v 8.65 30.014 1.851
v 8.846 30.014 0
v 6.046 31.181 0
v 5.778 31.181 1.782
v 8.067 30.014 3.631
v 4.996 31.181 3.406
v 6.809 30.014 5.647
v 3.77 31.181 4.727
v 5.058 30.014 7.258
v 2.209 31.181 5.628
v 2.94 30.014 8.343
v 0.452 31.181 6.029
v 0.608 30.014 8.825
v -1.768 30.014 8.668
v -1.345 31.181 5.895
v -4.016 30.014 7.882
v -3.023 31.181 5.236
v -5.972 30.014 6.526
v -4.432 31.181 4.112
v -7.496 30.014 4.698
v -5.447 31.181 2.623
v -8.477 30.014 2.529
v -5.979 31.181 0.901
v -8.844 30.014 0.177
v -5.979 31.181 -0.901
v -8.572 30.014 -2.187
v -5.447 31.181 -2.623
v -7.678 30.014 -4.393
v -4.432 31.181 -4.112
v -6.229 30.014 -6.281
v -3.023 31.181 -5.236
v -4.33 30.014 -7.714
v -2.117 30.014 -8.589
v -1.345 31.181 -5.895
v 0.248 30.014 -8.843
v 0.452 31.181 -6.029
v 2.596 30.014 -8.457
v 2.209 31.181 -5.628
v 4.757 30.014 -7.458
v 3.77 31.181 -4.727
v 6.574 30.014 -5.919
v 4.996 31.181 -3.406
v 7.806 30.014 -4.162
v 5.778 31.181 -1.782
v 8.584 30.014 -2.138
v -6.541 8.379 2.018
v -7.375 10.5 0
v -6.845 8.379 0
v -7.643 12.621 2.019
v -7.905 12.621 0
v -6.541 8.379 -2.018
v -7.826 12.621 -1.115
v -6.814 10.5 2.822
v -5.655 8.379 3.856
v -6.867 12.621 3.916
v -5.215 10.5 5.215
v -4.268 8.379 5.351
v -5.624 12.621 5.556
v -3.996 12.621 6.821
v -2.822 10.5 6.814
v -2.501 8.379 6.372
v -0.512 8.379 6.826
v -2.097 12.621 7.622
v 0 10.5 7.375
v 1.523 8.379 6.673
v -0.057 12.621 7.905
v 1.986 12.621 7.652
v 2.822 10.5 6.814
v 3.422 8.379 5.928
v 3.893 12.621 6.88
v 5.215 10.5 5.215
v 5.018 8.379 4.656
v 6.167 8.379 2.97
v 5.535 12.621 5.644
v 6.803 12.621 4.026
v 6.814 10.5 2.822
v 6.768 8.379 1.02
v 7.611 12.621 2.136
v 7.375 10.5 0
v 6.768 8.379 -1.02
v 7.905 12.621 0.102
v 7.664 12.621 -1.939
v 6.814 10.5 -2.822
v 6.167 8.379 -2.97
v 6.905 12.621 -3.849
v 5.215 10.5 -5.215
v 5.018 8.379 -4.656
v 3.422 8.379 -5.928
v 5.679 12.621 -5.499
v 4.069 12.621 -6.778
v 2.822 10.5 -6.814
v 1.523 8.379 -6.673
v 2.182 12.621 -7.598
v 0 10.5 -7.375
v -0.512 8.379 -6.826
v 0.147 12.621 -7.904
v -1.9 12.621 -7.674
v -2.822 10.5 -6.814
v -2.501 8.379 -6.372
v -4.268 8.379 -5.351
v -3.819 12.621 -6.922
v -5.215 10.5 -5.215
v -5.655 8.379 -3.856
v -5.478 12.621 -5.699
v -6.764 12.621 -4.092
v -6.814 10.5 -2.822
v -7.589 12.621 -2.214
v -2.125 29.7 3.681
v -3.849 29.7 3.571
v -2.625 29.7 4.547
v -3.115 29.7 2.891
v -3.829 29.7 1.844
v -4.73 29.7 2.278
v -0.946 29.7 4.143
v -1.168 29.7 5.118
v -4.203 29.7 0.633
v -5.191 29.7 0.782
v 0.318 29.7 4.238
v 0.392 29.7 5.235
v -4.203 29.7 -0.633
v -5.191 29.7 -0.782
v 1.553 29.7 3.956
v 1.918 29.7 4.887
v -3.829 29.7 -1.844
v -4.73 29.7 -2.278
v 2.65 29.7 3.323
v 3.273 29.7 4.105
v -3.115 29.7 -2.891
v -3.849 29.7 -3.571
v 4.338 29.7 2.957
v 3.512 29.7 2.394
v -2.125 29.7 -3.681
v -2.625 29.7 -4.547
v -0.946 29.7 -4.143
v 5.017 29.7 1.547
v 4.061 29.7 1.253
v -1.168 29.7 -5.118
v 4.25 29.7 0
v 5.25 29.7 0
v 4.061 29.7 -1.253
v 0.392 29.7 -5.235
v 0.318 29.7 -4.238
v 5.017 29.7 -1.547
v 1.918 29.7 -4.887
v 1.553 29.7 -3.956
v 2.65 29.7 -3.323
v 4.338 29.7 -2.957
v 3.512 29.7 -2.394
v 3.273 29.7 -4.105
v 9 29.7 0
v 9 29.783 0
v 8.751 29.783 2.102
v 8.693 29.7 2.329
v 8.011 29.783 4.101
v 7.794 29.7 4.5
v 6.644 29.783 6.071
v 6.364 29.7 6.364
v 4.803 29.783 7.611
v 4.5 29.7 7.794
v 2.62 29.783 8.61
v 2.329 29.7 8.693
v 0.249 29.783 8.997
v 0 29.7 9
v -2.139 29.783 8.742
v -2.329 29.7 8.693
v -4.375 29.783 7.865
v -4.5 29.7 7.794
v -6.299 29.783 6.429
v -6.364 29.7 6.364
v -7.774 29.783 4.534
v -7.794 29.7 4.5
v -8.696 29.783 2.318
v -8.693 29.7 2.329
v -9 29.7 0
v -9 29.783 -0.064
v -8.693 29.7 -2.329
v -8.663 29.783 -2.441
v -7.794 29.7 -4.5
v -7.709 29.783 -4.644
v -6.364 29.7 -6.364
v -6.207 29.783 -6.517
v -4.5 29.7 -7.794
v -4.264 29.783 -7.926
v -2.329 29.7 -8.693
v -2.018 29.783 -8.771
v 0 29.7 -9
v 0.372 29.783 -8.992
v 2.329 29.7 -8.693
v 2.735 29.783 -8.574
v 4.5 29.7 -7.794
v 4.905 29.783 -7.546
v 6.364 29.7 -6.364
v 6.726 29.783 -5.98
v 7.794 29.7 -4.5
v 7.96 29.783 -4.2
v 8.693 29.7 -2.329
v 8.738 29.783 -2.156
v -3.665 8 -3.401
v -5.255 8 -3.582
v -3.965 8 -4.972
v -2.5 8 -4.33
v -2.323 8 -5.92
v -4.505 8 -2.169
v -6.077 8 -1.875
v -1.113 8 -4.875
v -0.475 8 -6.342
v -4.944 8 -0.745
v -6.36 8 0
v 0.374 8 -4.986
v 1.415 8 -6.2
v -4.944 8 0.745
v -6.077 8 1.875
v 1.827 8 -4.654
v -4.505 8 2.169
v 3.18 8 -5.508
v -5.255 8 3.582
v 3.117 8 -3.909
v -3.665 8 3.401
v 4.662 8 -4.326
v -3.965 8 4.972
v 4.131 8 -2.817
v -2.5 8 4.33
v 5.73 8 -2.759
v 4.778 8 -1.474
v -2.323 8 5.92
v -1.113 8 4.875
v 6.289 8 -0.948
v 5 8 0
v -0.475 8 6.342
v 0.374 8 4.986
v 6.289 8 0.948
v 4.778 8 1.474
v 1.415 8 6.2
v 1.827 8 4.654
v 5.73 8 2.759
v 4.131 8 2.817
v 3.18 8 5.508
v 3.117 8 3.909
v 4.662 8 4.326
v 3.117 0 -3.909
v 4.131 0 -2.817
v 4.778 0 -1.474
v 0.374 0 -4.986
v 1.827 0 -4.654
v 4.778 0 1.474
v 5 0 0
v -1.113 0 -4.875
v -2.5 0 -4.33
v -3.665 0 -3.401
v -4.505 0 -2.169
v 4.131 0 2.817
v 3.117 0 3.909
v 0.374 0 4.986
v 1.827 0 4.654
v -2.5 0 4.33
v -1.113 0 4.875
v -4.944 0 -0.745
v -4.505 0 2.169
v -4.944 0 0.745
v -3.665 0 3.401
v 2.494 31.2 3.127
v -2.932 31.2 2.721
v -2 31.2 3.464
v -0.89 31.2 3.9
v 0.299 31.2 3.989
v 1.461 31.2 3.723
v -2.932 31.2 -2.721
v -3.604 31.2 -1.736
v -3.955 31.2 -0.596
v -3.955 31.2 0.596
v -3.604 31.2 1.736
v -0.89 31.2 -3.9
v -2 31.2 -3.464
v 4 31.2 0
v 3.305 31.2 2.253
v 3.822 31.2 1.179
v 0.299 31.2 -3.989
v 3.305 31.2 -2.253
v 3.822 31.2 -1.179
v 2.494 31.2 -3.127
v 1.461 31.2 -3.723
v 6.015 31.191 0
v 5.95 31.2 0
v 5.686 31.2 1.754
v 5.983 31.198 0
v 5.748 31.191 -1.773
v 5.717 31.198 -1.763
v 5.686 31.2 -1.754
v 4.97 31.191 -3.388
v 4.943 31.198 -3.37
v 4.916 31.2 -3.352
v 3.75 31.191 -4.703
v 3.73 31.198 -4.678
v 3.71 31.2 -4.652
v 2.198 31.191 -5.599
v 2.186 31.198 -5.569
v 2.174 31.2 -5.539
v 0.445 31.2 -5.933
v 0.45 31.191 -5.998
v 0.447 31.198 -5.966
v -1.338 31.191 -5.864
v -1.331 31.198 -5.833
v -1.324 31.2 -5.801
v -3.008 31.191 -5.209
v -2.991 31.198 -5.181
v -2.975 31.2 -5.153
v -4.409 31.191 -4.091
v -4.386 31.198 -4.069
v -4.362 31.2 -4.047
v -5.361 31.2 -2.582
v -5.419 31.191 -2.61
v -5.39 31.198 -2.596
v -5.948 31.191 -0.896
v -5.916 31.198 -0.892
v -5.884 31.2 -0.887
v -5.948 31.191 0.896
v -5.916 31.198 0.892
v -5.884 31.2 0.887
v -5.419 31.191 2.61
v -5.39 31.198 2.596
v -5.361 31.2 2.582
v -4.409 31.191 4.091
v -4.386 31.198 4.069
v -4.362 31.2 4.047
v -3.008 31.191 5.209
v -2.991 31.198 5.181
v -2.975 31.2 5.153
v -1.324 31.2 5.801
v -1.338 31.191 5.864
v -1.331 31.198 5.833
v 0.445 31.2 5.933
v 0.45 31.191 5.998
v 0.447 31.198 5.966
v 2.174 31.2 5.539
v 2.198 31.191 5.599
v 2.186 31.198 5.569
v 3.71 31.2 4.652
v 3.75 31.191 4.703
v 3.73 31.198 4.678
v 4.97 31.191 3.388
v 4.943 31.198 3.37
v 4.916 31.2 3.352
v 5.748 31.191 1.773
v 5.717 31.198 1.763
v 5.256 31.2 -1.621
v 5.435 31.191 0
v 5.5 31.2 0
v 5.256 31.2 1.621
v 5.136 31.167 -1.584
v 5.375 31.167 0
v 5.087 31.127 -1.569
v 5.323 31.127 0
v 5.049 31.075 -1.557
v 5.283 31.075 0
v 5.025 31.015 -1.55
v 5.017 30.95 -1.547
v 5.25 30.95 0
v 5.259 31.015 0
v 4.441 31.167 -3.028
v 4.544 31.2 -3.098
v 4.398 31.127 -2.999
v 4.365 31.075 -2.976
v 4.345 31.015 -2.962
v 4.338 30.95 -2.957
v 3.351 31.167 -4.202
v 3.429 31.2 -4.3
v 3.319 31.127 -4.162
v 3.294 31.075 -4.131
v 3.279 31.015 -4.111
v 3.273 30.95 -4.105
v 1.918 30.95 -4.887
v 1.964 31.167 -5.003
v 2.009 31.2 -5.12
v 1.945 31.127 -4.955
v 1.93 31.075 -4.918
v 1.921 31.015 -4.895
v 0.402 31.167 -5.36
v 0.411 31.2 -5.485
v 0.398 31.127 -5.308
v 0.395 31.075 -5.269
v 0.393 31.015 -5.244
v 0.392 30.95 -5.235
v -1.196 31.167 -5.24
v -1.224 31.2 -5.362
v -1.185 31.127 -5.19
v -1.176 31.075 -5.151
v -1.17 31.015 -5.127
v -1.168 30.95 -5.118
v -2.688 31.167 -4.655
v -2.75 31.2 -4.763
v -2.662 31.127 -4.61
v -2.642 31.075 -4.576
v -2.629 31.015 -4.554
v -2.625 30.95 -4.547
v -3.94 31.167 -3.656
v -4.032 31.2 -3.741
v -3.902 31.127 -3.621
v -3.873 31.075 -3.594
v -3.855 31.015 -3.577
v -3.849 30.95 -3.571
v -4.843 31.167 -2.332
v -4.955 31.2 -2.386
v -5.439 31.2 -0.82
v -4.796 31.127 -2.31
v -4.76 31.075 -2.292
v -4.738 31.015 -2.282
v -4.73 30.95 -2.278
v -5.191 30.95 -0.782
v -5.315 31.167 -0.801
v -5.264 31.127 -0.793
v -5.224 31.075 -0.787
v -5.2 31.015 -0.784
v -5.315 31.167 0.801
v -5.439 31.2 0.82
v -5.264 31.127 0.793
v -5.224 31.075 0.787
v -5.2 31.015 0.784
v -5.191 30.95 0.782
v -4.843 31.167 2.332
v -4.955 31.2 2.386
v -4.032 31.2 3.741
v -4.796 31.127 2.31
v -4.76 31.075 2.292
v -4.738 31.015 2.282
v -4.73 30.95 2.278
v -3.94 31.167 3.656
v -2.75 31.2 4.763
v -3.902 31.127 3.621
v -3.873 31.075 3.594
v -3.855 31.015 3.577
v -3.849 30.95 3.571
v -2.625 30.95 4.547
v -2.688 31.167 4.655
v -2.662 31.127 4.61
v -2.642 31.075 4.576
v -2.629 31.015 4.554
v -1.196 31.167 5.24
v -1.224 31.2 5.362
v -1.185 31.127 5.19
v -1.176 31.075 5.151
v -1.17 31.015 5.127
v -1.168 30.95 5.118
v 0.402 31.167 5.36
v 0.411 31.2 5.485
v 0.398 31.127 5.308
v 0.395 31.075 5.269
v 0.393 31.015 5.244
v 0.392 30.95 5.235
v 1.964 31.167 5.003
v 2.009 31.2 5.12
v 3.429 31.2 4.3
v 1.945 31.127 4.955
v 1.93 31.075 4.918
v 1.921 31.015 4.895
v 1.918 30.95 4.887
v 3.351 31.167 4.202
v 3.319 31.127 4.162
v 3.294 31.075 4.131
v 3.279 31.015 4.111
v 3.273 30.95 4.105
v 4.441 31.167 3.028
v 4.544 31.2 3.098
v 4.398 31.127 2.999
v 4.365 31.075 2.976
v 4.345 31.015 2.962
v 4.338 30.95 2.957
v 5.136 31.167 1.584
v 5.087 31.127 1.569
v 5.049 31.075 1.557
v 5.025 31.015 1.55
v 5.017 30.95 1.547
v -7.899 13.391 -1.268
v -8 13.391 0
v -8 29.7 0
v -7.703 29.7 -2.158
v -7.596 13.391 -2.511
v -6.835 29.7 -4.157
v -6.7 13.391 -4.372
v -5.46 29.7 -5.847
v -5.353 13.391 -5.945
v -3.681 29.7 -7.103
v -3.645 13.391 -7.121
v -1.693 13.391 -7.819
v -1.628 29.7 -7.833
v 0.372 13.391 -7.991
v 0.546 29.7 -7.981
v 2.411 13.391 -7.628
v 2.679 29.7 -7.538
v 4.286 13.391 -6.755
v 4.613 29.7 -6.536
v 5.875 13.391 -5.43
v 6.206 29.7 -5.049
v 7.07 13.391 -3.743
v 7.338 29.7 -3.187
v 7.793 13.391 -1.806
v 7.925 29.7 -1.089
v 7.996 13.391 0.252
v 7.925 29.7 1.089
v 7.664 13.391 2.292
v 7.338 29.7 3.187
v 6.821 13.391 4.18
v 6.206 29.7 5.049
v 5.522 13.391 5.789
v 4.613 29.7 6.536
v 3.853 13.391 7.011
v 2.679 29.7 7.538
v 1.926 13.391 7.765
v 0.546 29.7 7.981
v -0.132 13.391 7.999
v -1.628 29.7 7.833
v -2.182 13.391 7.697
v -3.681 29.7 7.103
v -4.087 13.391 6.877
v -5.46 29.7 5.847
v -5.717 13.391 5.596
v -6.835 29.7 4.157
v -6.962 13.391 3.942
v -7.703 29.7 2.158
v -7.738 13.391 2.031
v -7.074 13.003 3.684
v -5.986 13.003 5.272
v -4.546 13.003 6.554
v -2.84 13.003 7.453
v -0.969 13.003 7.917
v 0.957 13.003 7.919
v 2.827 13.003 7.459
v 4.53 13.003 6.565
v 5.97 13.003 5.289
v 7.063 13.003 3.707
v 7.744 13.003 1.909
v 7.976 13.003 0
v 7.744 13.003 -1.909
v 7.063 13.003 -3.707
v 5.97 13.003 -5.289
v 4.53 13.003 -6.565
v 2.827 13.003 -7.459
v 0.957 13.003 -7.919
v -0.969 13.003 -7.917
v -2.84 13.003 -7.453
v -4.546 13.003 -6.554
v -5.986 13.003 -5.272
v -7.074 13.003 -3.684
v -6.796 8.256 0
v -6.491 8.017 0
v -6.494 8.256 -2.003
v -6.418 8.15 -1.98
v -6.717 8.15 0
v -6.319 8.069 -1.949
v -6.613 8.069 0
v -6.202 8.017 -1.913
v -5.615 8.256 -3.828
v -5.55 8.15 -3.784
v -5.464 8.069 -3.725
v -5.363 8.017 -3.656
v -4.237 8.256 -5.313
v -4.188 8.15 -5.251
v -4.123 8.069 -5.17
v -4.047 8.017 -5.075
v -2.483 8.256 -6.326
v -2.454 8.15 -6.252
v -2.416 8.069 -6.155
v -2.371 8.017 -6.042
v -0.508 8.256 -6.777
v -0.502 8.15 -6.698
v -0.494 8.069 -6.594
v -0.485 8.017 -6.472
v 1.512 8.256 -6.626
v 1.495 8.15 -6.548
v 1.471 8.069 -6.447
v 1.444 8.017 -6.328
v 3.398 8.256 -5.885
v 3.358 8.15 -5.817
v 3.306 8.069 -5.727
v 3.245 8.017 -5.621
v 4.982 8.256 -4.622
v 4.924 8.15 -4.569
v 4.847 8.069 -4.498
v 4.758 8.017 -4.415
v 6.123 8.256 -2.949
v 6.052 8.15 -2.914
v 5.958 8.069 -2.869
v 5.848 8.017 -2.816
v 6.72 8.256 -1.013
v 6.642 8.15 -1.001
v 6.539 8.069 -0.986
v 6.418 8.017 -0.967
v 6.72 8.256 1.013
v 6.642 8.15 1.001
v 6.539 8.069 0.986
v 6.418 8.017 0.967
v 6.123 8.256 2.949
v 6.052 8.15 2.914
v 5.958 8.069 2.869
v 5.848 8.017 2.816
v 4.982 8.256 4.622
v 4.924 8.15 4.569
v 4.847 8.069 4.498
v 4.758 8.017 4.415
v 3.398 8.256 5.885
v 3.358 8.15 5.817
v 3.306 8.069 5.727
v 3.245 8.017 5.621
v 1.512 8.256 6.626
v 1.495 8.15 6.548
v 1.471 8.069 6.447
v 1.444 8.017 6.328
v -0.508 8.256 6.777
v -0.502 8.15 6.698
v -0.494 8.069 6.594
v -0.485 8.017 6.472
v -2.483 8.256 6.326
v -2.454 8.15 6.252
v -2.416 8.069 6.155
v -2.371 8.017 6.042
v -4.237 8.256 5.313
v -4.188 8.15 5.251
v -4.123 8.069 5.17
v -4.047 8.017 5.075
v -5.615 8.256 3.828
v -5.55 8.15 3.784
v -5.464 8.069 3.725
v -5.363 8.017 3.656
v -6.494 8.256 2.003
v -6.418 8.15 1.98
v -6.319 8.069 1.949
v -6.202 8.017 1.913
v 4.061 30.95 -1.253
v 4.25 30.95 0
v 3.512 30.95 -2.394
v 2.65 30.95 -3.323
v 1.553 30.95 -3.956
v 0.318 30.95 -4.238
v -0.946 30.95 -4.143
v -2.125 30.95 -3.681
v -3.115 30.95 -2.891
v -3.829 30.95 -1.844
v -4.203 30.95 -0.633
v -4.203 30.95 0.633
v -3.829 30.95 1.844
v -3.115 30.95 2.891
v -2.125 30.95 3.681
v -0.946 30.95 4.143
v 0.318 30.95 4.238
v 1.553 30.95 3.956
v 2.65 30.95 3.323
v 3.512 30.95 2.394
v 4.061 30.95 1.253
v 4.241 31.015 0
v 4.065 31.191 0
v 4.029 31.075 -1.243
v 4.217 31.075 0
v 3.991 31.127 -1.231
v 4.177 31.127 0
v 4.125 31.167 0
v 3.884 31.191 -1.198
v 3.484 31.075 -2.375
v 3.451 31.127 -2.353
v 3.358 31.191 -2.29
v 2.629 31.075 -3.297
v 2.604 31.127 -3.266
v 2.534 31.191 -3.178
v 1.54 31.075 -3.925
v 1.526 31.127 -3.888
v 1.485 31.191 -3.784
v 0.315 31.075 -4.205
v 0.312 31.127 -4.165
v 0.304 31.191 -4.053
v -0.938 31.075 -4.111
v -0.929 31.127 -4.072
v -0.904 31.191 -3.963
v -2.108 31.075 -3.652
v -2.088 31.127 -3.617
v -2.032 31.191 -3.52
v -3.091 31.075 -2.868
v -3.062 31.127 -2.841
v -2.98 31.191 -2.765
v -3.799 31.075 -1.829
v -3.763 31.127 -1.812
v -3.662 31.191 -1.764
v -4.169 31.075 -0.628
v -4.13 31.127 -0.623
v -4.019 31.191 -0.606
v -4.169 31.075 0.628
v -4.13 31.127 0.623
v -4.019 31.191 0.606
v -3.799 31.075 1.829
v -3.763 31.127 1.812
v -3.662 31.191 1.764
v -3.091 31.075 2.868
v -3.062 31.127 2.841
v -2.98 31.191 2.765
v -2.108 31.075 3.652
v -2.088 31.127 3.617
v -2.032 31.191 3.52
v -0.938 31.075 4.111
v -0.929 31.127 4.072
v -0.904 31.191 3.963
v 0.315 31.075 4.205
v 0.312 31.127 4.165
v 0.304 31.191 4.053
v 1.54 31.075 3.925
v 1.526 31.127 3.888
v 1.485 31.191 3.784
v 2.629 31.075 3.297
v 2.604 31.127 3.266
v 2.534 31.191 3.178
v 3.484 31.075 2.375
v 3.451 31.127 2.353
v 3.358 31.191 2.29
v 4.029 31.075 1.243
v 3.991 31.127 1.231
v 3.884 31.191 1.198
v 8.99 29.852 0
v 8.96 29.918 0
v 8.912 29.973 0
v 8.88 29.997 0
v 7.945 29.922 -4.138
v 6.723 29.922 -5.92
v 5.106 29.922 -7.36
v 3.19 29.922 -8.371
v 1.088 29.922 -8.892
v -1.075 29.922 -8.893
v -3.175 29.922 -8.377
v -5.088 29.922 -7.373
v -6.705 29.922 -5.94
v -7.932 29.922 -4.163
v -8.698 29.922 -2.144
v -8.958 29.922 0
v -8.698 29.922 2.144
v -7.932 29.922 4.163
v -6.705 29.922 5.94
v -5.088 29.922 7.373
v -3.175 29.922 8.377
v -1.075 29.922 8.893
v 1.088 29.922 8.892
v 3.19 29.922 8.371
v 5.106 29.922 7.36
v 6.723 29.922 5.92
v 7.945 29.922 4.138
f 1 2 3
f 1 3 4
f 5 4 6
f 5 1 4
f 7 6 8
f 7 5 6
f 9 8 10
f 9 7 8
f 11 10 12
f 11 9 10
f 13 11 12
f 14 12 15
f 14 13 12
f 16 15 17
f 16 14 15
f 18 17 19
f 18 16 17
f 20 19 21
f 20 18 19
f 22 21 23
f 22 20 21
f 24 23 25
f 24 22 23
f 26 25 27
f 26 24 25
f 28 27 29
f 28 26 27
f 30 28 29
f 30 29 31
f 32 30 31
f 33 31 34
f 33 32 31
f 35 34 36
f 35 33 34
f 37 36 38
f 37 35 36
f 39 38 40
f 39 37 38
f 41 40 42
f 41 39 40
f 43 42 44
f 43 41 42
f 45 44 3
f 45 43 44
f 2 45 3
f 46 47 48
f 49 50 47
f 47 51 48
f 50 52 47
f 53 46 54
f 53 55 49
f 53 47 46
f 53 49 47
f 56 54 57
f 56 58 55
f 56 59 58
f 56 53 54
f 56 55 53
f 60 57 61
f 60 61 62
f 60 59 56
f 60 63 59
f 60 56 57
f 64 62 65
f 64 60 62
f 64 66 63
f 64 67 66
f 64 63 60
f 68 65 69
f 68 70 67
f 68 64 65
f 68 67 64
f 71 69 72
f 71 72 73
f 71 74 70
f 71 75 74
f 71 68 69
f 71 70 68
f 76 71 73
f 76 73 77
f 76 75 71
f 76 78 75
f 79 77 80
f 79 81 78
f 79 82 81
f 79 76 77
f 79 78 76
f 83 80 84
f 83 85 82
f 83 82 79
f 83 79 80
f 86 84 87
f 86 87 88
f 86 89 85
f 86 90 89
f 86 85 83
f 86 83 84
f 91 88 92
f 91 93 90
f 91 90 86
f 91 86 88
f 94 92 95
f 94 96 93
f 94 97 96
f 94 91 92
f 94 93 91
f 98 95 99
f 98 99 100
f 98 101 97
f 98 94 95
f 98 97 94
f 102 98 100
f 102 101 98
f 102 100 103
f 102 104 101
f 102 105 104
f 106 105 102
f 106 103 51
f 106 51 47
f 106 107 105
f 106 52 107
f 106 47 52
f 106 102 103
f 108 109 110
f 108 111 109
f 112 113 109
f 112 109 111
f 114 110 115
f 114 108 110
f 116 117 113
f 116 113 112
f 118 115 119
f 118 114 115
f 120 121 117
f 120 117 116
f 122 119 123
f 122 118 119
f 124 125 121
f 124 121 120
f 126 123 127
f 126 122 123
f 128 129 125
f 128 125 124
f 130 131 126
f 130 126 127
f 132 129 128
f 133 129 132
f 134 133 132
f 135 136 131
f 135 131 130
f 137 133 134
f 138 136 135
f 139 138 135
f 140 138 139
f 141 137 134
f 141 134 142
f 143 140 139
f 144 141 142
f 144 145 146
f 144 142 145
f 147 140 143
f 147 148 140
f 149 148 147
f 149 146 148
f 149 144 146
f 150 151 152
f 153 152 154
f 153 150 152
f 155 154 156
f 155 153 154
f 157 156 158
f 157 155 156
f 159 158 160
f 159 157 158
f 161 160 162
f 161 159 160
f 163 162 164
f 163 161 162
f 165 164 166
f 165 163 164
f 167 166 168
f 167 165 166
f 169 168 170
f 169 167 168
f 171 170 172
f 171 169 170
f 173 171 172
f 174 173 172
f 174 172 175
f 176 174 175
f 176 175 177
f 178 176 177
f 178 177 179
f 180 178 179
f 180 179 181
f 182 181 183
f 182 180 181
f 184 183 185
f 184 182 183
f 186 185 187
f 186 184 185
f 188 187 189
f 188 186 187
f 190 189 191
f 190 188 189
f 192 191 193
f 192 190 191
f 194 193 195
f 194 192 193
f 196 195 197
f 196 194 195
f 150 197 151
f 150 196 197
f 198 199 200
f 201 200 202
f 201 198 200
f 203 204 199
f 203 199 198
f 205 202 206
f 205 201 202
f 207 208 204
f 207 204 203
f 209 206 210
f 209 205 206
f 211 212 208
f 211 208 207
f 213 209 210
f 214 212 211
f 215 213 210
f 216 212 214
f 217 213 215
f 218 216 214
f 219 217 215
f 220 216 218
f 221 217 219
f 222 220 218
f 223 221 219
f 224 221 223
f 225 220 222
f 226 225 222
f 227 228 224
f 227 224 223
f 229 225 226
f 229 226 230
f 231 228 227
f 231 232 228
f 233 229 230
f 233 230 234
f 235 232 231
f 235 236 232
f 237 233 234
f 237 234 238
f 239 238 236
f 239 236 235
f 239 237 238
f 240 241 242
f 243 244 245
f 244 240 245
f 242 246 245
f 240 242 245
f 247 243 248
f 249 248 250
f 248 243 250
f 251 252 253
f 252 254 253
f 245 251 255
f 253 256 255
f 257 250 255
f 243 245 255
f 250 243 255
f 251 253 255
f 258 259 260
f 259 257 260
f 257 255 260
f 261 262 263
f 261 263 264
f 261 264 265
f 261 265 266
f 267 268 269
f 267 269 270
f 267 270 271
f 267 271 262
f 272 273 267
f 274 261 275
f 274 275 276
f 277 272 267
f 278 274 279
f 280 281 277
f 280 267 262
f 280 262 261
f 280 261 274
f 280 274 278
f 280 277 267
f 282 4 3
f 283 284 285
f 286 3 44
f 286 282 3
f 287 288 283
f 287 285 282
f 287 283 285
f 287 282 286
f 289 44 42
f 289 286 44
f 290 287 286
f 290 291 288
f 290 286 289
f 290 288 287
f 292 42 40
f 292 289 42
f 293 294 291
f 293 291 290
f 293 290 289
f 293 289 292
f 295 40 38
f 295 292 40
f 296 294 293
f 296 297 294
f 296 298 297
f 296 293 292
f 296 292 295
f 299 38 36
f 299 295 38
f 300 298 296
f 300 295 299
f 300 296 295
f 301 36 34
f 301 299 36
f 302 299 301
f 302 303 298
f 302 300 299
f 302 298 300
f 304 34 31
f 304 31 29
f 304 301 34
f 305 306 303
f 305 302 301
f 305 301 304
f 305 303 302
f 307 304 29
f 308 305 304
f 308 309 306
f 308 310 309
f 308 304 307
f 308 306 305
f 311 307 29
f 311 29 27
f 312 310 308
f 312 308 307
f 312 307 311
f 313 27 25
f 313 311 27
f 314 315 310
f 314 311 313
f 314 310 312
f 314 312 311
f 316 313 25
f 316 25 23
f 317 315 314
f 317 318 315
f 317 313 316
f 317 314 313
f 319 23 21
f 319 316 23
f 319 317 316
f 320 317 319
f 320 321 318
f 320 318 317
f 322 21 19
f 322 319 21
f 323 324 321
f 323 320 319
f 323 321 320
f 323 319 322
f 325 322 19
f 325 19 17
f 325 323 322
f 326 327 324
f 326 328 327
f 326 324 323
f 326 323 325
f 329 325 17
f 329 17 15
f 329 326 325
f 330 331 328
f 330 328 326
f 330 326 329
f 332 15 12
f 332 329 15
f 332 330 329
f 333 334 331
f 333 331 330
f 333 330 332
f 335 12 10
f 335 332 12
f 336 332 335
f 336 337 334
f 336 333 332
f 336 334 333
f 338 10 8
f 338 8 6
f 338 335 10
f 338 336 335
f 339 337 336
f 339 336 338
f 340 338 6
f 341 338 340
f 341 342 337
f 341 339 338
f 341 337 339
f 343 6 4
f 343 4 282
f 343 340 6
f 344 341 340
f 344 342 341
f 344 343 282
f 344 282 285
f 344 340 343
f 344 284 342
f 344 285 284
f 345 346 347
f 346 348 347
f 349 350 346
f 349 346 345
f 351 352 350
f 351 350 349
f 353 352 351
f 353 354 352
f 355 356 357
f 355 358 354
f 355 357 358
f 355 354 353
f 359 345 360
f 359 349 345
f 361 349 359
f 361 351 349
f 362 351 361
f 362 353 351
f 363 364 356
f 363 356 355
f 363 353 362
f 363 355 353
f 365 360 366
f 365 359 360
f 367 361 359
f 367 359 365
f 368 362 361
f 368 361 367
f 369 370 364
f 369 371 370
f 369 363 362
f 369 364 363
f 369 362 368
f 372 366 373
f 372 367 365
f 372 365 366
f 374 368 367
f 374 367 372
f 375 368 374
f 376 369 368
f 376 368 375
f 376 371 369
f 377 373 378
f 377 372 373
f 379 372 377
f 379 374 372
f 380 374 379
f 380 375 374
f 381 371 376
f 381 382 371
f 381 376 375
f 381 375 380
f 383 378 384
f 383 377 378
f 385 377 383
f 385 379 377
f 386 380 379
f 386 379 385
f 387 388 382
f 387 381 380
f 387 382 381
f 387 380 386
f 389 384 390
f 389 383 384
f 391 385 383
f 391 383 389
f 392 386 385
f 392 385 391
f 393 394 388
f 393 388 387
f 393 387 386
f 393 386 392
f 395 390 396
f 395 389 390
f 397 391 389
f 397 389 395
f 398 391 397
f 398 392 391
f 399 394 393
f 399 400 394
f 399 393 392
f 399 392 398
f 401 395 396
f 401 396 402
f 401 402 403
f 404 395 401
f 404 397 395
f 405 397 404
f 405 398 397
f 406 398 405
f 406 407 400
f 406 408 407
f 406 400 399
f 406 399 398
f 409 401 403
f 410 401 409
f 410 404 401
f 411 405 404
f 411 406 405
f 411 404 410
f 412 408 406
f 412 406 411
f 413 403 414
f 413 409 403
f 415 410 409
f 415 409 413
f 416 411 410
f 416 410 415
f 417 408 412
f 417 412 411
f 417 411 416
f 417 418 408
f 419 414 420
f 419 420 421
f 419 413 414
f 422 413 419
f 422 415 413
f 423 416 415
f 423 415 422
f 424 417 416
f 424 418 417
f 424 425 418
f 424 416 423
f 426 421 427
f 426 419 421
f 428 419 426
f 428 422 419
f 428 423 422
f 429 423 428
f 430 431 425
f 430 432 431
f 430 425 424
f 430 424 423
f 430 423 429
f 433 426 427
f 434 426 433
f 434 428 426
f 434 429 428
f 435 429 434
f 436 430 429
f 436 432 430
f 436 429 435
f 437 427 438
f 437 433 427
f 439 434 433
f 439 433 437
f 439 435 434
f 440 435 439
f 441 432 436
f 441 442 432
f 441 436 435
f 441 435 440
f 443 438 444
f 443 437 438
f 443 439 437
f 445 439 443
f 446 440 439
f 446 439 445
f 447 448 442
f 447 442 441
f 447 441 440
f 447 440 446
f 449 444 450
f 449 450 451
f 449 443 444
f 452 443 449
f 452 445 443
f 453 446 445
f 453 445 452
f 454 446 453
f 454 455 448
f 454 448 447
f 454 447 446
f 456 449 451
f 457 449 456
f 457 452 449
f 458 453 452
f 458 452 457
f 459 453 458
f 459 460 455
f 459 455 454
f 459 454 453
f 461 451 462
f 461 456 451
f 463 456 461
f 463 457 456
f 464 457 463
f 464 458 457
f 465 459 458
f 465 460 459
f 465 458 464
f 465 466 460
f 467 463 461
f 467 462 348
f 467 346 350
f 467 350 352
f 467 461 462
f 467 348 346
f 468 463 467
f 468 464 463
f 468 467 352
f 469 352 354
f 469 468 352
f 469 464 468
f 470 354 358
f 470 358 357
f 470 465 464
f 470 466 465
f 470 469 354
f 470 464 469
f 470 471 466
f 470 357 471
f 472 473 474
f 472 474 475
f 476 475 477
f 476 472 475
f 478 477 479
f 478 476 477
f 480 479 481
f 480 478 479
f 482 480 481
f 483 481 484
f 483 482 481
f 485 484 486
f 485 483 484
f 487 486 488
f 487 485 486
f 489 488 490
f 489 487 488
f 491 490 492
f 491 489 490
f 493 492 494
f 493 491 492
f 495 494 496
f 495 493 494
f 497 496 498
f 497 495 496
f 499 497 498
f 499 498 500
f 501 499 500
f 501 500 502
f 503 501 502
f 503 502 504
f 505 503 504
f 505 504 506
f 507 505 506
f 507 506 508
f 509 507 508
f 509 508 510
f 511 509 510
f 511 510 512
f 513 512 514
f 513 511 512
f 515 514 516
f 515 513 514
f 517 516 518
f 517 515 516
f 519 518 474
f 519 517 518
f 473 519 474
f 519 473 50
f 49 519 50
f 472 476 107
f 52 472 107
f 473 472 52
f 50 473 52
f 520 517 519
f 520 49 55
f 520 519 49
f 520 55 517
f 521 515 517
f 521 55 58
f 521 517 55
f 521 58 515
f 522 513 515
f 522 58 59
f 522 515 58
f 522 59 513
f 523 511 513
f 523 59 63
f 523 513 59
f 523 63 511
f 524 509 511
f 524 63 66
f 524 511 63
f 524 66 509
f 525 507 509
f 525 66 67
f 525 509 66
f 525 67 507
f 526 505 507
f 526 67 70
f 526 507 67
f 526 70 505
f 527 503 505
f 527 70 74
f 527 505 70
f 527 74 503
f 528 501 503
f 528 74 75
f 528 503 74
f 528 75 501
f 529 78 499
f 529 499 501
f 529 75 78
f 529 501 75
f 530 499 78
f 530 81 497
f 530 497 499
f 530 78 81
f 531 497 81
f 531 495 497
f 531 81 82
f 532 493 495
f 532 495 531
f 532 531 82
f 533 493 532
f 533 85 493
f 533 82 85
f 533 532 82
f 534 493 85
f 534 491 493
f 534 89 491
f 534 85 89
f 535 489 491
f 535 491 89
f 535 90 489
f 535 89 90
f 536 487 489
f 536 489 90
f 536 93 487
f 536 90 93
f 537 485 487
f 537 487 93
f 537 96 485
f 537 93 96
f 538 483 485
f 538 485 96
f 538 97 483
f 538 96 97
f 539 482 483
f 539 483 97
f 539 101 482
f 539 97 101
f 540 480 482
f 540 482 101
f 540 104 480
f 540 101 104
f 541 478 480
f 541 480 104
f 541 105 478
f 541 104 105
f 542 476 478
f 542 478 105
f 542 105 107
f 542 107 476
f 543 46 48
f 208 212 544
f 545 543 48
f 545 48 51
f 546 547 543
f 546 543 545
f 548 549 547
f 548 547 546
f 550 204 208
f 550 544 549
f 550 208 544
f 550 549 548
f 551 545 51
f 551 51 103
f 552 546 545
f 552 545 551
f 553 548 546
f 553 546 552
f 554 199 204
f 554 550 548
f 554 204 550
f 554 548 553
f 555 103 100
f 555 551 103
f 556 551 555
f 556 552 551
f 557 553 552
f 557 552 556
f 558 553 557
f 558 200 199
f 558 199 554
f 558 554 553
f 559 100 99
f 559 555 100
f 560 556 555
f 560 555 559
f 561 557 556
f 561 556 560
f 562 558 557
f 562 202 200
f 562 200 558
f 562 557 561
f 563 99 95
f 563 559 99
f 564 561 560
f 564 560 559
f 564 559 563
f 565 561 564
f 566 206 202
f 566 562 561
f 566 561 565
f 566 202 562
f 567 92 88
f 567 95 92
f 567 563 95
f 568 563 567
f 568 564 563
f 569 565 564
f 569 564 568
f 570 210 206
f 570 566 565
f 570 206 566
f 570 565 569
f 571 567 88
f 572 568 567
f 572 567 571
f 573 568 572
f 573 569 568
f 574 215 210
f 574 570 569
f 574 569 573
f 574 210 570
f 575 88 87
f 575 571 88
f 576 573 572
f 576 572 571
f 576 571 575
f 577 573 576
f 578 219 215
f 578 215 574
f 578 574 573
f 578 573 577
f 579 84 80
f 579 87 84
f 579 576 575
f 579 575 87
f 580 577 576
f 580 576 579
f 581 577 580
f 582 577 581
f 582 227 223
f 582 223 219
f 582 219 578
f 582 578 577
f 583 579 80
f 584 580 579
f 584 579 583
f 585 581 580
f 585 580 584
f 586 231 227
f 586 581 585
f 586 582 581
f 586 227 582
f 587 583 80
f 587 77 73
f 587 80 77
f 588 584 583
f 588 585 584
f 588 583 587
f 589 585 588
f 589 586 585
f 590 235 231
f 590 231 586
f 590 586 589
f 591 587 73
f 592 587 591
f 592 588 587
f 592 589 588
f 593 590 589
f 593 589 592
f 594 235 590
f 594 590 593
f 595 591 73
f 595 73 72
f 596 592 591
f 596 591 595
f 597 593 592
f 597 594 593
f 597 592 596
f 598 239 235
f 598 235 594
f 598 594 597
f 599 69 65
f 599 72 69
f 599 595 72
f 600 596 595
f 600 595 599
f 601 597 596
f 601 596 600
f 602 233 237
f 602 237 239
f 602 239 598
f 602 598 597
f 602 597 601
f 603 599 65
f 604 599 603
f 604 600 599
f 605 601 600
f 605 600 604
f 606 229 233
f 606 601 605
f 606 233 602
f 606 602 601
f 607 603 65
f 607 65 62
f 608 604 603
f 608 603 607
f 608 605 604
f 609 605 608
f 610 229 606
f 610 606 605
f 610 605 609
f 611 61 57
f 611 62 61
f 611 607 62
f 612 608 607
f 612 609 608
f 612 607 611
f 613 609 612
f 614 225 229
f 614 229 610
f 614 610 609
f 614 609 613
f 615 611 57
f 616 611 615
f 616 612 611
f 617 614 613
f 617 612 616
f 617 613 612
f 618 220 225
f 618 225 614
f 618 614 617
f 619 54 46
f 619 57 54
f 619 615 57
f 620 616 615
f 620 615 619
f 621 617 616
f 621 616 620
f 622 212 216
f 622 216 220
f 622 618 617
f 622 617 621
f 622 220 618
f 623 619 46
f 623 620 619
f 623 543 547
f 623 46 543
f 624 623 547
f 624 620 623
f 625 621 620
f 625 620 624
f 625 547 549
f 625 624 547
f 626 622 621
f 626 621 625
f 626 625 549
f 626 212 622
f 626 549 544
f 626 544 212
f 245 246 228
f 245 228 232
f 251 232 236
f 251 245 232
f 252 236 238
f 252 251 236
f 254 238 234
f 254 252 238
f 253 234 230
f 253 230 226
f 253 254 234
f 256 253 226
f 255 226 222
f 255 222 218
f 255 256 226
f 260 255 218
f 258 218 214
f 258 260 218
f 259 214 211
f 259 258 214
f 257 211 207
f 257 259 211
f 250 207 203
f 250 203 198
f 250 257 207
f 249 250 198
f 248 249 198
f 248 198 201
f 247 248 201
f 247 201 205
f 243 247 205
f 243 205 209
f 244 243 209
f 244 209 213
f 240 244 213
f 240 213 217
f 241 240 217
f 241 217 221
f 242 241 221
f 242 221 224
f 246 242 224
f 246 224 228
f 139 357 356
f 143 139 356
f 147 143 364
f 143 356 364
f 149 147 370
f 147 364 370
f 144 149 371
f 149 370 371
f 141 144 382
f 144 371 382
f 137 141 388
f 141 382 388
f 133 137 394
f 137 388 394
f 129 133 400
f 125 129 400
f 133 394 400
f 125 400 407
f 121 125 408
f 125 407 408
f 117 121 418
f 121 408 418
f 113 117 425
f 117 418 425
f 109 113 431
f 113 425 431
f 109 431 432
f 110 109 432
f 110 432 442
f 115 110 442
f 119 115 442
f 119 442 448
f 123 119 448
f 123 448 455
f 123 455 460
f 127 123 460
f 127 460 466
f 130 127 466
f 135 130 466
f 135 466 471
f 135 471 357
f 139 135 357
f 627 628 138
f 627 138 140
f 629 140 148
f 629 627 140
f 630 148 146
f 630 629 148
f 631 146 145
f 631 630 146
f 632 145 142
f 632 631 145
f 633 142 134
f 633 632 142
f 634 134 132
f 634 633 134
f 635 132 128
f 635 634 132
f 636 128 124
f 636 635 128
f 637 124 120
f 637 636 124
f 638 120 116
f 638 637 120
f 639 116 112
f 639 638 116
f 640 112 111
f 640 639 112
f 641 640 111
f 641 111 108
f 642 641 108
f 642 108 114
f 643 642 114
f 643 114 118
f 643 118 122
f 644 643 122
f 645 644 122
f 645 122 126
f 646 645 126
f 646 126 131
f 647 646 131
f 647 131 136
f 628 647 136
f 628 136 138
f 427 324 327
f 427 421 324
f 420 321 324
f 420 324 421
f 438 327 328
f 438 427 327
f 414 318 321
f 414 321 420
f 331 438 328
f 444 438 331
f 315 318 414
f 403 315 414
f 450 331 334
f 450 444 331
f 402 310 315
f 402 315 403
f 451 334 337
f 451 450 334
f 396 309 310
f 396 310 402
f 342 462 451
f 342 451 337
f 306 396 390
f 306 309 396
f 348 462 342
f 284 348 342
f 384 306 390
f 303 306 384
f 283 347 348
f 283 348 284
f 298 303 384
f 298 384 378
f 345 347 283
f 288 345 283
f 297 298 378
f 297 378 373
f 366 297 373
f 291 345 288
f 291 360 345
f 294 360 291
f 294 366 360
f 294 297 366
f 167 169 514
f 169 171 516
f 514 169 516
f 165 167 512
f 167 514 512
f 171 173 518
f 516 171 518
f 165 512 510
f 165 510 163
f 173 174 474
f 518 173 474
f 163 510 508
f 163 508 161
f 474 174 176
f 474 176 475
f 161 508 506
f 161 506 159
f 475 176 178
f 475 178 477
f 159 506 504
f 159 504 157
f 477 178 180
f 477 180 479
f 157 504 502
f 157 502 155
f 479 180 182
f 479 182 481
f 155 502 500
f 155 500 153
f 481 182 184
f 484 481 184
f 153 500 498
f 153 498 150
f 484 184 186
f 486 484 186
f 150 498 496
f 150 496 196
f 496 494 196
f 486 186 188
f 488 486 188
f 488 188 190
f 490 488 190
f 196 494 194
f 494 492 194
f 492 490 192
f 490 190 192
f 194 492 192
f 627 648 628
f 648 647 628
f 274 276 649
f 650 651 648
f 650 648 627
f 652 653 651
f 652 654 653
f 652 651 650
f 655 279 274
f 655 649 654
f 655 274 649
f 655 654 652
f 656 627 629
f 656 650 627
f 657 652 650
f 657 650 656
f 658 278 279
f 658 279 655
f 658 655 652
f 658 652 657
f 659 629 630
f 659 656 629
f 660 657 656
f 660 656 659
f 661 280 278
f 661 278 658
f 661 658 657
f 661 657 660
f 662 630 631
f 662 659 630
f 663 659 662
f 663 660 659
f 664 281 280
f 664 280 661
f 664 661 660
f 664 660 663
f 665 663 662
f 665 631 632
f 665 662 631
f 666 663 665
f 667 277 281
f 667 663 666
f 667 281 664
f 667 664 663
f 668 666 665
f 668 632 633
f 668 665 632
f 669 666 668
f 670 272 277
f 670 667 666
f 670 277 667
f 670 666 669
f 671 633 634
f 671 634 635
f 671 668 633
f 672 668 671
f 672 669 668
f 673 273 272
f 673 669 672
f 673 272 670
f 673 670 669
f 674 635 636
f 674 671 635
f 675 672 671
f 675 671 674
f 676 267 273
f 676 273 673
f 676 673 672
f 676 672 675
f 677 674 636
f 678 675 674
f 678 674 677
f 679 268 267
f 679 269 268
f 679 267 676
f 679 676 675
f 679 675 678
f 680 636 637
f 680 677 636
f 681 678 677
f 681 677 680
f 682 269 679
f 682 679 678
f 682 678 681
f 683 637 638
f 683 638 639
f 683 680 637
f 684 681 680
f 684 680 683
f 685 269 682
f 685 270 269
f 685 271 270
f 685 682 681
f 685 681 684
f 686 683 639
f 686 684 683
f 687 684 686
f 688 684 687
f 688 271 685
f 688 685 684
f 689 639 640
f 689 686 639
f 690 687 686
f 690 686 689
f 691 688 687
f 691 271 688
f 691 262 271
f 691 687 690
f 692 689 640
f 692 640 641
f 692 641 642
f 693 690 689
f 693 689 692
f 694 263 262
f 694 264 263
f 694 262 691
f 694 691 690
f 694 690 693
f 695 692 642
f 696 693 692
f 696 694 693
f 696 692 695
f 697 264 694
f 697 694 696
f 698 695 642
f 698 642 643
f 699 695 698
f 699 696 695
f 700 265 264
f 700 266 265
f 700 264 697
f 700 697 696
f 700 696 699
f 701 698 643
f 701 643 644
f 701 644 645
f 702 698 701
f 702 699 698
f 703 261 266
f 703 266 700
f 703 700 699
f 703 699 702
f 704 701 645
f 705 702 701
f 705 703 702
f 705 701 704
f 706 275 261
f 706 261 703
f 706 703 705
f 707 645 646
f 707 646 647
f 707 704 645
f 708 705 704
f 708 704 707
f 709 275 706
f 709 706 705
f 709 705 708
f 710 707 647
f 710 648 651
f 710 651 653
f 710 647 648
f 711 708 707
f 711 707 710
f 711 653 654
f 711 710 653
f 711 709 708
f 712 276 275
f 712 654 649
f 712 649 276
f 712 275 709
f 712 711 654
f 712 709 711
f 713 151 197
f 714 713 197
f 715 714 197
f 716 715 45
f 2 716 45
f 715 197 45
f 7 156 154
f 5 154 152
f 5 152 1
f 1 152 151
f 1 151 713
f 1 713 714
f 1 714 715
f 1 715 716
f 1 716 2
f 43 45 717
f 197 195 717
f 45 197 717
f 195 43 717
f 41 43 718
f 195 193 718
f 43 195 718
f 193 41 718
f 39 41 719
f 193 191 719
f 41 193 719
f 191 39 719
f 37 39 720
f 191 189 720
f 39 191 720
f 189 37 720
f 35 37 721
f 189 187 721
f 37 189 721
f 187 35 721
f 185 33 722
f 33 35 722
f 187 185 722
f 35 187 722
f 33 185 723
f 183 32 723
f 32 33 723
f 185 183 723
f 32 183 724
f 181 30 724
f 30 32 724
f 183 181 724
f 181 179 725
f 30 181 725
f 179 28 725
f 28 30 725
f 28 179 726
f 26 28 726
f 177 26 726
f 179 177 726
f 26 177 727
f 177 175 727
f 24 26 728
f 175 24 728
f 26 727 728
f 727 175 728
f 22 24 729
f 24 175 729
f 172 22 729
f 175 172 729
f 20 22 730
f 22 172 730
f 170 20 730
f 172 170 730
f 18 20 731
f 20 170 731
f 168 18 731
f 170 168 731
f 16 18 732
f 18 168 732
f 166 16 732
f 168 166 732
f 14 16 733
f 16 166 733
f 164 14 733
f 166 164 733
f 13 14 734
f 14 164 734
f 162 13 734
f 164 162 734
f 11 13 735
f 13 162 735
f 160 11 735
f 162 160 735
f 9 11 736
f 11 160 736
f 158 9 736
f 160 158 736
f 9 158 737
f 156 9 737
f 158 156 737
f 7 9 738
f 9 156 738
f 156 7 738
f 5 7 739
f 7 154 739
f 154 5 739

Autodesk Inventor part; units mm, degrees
ref_plane "YZ Plane" through (0, 0, 0) normal (1, 0, 0) x (0, 1, 0)
ref_plane "XZ Plane" through (0, 0, 0) normal (0, 1, 0) x (-1, 0, 0)
ref_plane "XY Plane" through (0, 0, 0) normal (0, 0, 1) x (1, 0, 0)
sketch "Sketch1" plane through (0, 0, 0) normal (0, 1, 0) x (-1, 0, 0)
  circle A0 centre (0, 0) radius 8
  dimension "d0" = 16
extrude "Extrusion1" add sketch "Sketch1" along normal blind 29.7
sketch "Sketch2" plane through (0, 29.7, 0) normal (0, 1, 0) x (1, 0, 0)
  circle A0 centre (0, 0) radius 9
  dimension "d3" = 18
extrude "Extrusion2" add sketch "Sketch2" along normal blind 1.5
chamfer "Chamfer1" distance 3 distance2 1.25 1 edges at (-9, 31.2, 0) measured on face at (4.3113, 31.2, 2.4985)
sketch "Sketch3" plane through (0, 0, 0) normal (0, -1, 0) x (1, 0, 0)
  circle A0 centre (0, 0) radius 5
  circle A1 centre (0, 0) radius 8 projected
  dimension "d9" = 10
extrude "Extrusion3" cut sketch "Sketch3" against normal blind 8
chamfer "Chamfer2" distance 5 distance2 1.25 1 edges at (8, 8, 0) measured on face at (-7.8964, 15.2333, -1.2833)
fillet "Fillet1" radius 3.175 1 edges at (8, 13, 0)
fillet "Fillet2" radius 0.5 1 edges at (6.75, 8, 0)
thread "Thread1" size "M16x1" class "6g" standard "ISO Metric profile" full length
sketch "Sketch4" plane through (0, 31.2, 0) normal (0, 1, 0) x (1, 0, 0)
  circle A0 centre (0, 0) radius 4.25
  circle A1 centre (0, 0) radius 5.25
  circle A2 centre (0, 0) radius 6 construction
  dimension "d22" = 0.75
  dimension "d23" = 1
  dimension "d25" = 10.5
extrude "Extrusion4" cut sketch "Sketch4" against normal blind 1.5
fillet "Fillet3" radius 0.25 4 edges at (-9, 29.95, 0) (-6, 31.2, 0) (-5.25, 31.2, 0) (-4.25, 31.2, 0)
properties part number "Button_housing" material "Brass, Soft Yellow"
